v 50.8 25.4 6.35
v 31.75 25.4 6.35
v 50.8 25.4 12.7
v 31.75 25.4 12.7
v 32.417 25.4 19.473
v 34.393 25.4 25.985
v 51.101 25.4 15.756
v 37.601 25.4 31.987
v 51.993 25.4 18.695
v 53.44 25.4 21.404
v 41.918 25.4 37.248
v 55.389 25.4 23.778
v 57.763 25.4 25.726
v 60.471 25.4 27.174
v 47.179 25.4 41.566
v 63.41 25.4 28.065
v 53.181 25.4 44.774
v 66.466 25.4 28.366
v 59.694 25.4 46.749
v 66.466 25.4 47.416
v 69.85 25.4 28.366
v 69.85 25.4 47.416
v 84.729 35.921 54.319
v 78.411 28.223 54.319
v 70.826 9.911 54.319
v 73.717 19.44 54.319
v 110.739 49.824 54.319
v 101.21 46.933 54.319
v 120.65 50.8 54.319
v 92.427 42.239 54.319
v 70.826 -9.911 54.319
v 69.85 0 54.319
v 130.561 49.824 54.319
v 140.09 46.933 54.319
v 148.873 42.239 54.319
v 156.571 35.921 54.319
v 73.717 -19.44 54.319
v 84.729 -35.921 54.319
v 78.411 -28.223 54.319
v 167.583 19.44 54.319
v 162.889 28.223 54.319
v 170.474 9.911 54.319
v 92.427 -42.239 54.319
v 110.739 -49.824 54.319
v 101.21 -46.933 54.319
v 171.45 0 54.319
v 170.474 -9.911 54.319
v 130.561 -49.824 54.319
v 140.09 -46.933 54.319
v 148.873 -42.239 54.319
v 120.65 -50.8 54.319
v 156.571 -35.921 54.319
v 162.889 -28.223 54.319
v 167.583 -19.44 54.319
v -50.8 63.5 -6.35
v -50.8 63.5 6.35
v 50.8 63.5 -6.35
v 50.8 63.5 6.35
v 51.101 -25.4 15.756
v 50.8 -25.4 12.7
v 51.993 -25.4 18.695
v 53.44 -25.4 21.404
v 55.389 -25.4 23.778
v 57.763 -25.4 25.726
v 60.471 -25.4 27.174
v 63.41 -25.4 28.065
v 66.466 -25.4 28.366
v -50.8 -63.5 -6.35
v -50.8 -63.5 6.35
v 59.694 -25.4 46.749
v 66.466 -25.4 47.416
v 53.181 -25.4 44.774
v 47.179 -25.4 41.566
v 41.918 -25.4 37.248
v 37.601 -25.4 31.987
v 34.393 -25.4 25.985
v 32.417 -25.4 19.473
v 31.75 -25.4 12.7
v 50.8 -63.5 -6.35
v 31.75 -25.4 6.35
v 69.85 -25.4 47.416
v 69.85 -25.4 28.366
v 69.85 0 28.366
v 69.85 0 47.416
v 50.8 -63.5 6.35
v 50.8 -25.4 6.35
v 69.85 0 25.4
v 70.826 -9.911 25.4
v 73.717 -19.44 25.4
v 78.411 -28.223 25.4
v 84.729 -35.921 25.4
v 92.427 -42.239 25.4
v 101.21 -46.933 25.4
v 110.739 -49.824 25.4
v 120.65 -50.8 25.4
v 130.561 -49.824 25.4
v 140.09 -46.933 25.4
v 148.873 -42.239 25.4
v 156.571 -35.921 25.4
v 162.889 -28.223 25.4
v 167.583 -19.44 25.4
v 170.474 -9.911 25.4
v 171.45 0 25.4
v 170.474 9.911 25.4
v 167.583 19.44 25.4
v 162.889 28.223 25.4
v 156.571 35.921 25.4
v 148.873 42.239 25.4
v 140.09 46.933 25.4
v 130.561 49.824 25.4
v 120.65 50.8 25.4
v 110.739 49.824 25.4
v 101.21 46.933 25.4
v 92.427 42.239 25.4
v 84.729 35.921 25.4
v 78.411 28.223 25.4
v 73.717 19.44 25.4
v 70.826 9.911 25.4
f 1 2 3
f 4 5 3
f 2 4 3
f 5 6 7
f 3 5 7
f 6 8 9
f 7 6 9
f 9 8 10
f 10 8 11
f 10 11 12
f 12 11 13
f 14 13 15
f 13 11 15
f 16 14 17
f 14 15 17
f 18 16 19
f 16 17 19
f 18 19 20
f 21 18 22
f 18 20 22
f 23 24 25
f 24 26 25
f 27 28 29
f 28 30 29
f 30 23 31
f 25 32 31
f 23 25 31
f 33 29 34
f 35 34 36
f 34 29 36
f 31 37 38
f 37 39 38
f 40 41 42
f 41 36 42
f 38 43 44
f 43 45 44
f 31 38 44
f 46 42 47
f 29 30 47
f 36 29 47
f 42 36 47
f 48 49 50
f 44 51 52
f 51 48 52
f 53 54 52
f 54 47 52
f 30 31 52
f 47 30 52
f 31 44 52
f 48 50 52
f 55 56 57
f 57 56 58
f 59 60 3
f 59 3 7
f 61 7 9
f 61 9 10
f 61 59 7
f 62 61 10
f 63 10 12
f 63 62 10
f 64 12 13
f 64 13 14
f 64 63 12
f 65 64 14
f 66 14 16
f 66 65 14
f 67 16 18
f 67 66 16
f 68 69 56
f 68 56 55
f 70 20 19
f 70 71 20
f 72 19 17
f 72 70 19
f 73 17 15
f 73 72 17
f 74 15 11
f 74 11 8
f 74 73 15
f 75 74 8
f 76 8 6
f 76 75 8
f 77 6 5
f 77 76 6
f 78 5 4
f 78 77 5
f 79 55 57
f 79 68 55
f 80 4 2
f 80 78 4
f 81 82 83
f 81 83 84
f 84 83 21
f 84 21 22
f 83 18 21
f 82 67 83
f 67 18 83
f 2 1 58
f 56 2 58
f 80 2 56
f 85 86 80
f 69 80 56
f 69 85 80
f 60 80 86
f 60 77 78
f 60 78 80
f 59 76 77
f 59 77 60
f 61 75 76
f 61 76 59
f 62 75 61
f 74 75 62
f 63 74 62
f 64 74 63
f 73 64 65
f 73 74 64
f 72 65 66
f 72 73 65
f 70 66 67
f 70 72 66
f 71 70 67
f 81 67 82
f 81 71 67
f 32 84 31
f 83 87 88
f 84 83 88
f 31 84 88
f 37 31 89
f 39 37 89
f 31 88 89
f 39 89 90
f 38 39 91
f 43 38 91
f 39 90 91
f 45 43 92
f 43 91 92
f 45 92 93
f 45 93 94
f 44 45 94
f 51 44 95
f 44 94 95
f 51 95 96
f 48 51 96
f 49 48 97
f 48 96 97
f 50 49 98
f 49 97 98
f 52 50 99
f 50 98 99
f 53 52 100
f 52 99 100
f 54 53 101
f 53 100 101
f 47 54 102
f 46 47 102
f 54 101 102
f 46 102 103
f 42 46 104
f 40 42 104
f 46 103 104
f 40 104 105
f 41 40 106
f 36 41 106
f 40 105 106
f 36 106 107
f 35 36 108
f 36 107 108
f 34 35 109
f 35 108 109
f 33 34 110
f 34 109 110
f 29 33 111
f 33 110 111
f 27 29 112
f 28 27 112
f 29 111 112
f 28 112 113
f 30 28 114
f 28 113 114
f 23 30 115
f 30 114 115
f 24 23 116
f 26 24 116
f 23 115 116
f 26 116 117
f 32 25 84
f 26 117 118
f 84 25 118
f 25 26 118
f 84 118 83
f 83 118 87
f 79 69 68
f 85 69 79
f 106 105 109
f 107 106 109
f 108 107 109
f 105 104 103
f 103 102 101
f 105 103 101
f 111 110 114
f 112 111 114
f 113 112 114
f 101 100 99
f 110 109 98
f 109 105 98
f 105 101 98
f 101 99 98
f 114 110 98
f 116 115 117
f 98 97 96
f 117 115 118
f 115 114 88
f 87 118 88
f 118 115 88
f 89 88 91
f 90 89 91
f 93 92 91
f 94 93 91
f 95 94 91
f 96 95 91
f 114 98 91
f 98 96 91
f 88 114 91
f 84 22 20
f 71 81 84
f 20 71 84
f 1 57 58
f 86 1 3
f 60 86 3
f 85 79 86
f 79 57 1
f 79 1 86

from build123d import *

# Parameters (mm, degrees)
F1_DEPTH = 63.5
F2_DEPTH = 25.4


with BuildPart() as f1:
    # F0 (on Front) → F1 (new body, symmetric)
    with BuildSketch(Plane.XZ):
        Polygon((50.8, -6.35), (50.8, 6.35), (31.75, 6.35), (-50.8, 6.35), (-50.8, -6.35), align=None)
    extrude(amount=F1_DEPTH, both=True)

    # F0 (on Front) → F2 (join, symmetric)
    with BuildSketch(Plane.XZ):
        with BuildLine():
            Line((31.75, 6.35), (50.8, 6.35))
            Line((50.8, 6.35), (50.8, 12.7))
            ThreePointArc((50.8, 12.7), (55.388588, 23.77783), (66.466418, 28.366418))
            Line((66.466418, 28.366418), (69.85, 28.366418))
            Line((69.85, 28.366418), (69.85, 47.416418))
            Line((69.85, 47.416418), (66.466418, 47.416418))
            ThreePointArc((66.466418, 47.416418), (41.918203, 37.248215), (31.75, 12.7))
            Line((31.75, 12.7), (31.75, 6.35))
        make_face()
    extrude(amount=F2_DEPTH, both=True)

    # F0 (on Front) → F3 (revolve)
    with BuildSketch(Plane.XZ):
        Polygon((69.85, 47.416418), (69.85, 28.366418), (69.85, 25.4), (120.65, 25.4), (120.65, 54.318989), (69.85, 54.318989), align=None)
    revolve(axis=Axis((120.65, 0, 39.859495), (0, 0, 1)))


solid = f1.part
